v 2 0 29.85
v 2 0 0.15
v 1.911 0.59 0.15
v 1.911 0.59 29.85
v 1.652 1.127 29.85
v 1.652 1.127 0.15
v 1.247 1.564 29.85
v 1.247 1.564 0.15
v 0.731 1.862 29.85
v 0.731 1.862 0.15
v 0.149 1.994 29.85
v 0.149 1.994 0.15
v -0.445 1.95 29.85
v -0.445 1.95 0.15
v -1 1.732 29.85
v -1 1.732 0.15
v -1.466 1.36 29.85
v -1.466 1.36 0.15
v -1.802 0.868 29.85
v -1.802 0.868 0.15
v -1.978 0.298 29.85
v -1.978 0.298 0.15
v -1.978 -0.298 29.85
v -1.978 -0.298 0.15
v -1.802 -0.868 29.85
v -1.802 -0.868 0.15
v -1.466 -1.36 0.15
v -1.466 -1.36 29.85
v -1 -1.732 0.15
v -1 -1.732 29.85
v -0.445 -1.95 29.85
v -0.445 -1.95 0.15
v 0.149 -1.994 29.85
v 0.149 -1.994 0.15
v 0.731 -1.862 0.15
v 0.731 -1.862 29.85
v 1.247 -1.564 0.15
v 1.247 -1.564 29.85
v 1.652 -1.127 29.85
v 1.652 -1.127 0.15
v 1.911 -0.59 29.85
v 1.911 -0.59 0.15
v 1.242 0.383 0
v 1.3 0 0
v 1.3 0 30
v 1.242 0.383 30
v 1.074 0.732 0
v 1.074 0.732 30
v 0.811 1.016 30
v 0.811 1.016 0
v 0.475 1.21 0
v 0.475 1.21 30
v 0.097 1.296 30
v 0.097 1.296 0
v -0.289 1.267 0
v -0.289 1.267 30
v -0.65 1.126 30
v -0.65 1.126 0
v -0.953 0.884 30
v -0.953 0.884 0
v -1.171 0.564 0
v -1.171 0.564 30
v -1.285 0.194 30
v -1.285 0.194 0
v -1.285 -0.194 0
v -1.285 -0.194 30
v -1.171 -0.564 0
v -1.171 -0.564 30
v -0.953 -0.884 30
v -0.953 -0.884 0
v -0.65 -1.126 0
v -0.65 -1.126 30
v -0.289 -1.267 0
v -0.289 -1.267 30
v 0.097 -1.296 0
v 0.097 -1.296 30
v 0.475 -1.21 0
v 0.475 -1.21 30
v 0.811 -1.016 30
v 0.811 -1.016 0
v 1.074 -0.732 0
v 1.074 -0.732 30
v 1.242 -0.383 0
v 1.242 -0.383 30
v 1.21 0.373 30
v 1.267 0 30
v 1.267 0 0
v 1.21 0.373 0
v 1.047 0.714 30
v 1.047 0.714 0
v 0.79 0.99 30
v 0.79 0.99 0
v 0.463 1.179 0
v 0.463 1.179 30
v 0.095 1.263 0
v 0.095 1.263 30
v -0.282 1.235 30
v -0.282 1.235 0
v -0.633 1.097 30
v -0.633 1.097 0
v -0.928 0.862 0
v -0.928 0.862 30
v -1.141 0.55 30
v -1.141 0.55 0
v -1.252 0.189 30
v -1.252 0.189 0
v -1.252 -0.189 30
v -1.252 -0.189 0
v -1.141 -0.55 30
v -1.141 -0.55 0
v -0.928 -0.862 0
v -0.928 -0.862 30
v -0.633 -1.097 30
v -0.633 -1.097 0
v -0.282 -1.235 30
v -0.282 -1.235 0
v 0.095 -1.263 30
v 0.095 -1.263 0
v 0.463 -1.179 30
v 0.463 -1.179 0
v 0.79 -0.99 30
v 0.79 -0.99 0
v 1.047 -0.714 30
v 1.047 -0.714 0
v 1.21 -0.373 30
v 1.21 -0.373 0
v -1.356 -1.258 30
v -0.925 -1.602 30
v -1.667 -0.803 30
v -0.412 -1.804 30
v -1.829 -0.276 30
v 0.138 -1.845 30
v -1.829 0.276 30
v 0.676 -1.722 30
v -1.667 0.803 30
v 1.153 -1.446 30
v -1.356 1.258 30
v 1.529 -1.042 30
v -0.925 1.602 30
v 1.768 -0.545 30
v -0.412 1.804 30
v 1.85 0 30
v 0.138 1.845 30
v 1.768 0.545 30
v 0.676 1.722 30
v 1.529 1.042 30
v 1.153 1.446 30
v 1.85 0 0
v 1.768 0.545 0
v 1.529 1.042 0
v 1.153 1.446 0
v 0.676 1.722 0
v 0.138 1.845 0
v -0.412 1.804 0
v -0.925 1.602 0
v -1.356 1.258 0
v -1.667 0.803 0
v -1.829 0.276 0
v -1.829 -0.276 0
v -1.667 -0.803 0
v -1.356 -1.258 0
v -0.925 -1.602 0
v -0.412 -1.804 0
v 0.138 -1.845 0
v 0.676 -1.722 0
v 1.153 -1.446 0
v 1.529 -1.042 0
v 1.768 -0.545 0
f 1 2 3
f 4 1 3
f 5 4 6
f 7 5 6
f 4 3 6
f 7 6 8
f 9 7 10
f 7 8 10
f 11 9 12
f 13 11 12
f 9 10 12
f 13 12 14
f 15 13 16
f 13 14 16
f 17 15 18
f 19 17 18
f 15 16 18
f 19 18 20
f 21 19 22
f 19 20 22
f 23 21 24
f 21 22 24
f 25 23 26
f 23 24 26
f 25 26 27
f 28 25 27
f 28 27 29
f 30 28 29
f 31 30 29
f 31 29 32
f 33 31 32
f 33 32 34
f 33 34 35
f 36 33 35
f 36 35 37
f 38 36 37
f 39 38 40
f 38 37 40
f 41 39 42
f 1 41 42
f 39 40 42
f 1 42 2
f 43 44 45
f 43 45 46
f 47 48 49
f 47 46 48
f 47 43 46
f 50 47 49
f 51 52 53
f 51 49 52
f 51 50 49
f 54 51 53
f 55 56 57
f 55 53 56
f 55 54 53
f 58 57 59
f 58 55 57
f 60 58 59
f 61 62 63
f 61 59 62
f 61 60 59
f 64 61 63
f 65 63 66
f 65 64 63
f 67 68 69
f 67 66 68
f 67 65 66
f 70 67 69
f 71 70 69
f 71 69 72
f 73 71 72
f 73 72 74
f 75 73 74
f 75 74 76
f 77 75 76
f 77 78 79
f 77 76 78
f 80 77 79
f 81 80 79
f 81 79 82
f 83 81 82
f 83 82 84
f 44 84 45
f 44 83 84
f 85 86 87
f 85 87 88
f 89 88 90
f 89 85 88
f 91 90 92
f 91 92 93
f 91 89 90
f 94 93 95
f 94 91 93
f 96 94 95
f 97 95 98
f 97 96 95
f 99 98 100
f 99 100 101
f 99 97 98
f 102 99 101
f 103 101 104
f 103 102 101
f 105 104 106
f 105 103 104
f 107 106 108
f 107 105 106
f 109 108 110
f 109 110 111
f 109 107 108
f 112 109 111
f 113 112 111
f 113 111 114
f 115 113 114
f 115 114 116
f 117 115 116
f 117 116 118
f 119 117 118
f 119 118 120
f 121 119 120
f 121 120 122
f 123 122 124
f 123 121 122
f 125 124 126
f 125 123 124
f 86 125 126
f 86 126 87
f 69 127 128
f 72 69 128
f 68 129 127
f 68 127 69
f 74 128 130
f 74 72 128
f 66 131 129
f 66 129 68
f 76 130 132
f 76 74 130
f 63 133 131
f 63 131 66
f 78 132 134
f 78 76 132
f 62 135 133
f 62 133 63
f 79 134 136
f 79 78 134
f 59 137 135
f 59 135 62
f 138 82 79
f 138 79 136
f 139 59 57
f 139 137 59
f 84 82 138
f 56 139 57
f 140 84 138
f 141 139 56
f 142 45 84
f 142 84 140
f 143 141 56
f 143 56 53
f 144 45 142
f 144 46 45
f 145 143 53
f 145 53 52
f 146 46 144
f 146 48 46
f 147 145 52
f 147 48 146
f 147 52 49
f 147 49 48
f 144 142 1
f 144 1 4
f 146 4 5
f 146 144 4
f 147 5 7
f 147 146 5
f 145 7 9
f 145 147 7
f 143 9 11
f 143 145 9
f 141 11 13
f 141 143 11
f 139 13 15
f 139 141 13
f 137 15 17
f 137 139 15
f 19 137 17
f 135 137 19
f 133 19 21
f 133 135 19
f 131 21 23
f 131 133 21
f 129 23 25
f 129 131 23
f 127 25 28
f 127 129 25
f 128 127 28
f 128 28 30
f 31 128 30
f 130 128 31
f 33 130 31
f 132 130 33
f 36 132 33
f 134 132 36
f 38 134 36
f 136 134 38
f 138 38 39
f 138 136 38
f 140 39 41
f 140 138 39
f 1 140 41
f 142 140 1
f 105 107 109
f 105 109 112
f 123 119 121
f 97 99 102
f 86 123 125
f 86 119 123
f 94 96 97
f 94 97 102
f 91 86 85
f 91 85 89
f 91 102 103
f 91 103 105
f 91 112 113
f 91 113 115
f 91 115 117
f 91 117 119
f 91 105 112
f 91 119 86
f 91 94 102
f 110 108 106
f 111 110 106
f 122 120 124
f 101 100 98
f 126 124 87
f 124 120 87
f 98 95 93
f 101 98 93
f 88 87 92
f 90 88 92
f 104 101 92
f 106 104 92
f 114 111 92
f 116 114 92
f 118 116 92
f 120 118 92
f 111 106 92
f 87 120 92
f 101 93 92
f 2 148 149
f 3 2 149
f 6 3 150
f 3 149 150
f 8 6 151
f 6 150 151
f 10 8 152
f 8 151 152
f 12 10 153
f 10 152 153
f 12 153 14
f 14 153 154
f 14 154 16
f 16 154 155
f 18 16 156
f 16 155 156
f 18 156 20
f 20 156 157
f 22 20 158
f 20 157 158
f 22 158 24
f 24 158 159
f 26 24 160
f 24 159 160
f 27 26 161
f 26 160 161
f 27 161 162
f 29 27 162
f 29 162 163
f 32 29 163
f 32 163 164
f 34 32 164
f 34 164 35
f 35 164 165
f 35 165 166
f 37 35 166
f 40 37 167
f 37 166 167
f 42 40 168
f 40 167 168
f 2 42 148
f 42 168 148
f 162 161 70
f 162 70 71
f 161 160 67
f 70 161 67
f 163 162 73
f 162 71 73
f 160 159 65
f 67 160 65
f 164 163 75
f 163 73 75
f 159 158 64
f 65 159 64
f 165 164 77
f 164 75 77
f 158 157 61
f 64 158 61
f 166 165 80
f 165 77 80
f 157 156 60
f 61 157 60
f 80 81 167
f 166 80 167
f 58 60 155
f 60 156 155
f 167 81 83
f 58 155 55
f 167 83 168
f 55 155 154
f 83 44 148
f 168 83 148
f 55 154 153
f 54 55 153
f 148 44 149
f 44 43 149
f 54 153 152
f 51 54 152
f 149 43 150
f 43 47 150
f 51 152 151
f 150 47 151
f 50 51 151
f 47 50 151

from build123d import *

# Parameters (mm, degrees)
SKETCH1_R           = 2
BOSS_EXTRUDE2_DEPTH = 30
SHELL1_T            = -0.7
END1_CHAMFER_SIZE   = 0.15
END2_CHAMFER_SIZE   = 0.15
SKETCH2_R           = 1.26660903
BOSS_EXTRUDE8_DEPTH = 30


with BuildPart() as part:
    # Sketch1 → Boss-Extrude2 (new body)
    with BuildSketch(Plane.XY):
        Circle(SKETCH1_R)
    extrude(amount=BOSS_EXTRUDE2_DEPTH)

    # Shell1
    shell1_openings = [part.faces().sort_by_distance(p)[0] for p in [
        (0, 0, 30),
        (0, 0, 0),
    ]]
    offset(amount=SHELL1_T, openings=shell1_openings, kind=Kind.INTERSECTION)

    # End1 Chamfer
    end1_chamfer_edges = [part.edges().sort_by_distance(p)[0] for p in [
        (-2, 0, 0),
    ]]
    chamfer(end1_chamfer_edges, length=END1_CHAMFER_SIZE)

    # End2 Chamfer
    end2_chamfer_edges = [part.edges().sort_by_distance(p)[0] for p in [
        (-2, 0, 30),
    ]]
    chamfer(end2_chamfer_edges, length=END2_CHAMFER_SIZE)


with BuildPart() as body_2:
    # Sketch2 → Boss-Extrude8 (new, through all)
    with BuildSketch(Plane.XY.offset(30)):
        Circle(SKETCH2_R)
    extrude(amount=-BOSS_EXTRUDE8_DEPTH)


solid = Compound([part.part, body_2.part])
